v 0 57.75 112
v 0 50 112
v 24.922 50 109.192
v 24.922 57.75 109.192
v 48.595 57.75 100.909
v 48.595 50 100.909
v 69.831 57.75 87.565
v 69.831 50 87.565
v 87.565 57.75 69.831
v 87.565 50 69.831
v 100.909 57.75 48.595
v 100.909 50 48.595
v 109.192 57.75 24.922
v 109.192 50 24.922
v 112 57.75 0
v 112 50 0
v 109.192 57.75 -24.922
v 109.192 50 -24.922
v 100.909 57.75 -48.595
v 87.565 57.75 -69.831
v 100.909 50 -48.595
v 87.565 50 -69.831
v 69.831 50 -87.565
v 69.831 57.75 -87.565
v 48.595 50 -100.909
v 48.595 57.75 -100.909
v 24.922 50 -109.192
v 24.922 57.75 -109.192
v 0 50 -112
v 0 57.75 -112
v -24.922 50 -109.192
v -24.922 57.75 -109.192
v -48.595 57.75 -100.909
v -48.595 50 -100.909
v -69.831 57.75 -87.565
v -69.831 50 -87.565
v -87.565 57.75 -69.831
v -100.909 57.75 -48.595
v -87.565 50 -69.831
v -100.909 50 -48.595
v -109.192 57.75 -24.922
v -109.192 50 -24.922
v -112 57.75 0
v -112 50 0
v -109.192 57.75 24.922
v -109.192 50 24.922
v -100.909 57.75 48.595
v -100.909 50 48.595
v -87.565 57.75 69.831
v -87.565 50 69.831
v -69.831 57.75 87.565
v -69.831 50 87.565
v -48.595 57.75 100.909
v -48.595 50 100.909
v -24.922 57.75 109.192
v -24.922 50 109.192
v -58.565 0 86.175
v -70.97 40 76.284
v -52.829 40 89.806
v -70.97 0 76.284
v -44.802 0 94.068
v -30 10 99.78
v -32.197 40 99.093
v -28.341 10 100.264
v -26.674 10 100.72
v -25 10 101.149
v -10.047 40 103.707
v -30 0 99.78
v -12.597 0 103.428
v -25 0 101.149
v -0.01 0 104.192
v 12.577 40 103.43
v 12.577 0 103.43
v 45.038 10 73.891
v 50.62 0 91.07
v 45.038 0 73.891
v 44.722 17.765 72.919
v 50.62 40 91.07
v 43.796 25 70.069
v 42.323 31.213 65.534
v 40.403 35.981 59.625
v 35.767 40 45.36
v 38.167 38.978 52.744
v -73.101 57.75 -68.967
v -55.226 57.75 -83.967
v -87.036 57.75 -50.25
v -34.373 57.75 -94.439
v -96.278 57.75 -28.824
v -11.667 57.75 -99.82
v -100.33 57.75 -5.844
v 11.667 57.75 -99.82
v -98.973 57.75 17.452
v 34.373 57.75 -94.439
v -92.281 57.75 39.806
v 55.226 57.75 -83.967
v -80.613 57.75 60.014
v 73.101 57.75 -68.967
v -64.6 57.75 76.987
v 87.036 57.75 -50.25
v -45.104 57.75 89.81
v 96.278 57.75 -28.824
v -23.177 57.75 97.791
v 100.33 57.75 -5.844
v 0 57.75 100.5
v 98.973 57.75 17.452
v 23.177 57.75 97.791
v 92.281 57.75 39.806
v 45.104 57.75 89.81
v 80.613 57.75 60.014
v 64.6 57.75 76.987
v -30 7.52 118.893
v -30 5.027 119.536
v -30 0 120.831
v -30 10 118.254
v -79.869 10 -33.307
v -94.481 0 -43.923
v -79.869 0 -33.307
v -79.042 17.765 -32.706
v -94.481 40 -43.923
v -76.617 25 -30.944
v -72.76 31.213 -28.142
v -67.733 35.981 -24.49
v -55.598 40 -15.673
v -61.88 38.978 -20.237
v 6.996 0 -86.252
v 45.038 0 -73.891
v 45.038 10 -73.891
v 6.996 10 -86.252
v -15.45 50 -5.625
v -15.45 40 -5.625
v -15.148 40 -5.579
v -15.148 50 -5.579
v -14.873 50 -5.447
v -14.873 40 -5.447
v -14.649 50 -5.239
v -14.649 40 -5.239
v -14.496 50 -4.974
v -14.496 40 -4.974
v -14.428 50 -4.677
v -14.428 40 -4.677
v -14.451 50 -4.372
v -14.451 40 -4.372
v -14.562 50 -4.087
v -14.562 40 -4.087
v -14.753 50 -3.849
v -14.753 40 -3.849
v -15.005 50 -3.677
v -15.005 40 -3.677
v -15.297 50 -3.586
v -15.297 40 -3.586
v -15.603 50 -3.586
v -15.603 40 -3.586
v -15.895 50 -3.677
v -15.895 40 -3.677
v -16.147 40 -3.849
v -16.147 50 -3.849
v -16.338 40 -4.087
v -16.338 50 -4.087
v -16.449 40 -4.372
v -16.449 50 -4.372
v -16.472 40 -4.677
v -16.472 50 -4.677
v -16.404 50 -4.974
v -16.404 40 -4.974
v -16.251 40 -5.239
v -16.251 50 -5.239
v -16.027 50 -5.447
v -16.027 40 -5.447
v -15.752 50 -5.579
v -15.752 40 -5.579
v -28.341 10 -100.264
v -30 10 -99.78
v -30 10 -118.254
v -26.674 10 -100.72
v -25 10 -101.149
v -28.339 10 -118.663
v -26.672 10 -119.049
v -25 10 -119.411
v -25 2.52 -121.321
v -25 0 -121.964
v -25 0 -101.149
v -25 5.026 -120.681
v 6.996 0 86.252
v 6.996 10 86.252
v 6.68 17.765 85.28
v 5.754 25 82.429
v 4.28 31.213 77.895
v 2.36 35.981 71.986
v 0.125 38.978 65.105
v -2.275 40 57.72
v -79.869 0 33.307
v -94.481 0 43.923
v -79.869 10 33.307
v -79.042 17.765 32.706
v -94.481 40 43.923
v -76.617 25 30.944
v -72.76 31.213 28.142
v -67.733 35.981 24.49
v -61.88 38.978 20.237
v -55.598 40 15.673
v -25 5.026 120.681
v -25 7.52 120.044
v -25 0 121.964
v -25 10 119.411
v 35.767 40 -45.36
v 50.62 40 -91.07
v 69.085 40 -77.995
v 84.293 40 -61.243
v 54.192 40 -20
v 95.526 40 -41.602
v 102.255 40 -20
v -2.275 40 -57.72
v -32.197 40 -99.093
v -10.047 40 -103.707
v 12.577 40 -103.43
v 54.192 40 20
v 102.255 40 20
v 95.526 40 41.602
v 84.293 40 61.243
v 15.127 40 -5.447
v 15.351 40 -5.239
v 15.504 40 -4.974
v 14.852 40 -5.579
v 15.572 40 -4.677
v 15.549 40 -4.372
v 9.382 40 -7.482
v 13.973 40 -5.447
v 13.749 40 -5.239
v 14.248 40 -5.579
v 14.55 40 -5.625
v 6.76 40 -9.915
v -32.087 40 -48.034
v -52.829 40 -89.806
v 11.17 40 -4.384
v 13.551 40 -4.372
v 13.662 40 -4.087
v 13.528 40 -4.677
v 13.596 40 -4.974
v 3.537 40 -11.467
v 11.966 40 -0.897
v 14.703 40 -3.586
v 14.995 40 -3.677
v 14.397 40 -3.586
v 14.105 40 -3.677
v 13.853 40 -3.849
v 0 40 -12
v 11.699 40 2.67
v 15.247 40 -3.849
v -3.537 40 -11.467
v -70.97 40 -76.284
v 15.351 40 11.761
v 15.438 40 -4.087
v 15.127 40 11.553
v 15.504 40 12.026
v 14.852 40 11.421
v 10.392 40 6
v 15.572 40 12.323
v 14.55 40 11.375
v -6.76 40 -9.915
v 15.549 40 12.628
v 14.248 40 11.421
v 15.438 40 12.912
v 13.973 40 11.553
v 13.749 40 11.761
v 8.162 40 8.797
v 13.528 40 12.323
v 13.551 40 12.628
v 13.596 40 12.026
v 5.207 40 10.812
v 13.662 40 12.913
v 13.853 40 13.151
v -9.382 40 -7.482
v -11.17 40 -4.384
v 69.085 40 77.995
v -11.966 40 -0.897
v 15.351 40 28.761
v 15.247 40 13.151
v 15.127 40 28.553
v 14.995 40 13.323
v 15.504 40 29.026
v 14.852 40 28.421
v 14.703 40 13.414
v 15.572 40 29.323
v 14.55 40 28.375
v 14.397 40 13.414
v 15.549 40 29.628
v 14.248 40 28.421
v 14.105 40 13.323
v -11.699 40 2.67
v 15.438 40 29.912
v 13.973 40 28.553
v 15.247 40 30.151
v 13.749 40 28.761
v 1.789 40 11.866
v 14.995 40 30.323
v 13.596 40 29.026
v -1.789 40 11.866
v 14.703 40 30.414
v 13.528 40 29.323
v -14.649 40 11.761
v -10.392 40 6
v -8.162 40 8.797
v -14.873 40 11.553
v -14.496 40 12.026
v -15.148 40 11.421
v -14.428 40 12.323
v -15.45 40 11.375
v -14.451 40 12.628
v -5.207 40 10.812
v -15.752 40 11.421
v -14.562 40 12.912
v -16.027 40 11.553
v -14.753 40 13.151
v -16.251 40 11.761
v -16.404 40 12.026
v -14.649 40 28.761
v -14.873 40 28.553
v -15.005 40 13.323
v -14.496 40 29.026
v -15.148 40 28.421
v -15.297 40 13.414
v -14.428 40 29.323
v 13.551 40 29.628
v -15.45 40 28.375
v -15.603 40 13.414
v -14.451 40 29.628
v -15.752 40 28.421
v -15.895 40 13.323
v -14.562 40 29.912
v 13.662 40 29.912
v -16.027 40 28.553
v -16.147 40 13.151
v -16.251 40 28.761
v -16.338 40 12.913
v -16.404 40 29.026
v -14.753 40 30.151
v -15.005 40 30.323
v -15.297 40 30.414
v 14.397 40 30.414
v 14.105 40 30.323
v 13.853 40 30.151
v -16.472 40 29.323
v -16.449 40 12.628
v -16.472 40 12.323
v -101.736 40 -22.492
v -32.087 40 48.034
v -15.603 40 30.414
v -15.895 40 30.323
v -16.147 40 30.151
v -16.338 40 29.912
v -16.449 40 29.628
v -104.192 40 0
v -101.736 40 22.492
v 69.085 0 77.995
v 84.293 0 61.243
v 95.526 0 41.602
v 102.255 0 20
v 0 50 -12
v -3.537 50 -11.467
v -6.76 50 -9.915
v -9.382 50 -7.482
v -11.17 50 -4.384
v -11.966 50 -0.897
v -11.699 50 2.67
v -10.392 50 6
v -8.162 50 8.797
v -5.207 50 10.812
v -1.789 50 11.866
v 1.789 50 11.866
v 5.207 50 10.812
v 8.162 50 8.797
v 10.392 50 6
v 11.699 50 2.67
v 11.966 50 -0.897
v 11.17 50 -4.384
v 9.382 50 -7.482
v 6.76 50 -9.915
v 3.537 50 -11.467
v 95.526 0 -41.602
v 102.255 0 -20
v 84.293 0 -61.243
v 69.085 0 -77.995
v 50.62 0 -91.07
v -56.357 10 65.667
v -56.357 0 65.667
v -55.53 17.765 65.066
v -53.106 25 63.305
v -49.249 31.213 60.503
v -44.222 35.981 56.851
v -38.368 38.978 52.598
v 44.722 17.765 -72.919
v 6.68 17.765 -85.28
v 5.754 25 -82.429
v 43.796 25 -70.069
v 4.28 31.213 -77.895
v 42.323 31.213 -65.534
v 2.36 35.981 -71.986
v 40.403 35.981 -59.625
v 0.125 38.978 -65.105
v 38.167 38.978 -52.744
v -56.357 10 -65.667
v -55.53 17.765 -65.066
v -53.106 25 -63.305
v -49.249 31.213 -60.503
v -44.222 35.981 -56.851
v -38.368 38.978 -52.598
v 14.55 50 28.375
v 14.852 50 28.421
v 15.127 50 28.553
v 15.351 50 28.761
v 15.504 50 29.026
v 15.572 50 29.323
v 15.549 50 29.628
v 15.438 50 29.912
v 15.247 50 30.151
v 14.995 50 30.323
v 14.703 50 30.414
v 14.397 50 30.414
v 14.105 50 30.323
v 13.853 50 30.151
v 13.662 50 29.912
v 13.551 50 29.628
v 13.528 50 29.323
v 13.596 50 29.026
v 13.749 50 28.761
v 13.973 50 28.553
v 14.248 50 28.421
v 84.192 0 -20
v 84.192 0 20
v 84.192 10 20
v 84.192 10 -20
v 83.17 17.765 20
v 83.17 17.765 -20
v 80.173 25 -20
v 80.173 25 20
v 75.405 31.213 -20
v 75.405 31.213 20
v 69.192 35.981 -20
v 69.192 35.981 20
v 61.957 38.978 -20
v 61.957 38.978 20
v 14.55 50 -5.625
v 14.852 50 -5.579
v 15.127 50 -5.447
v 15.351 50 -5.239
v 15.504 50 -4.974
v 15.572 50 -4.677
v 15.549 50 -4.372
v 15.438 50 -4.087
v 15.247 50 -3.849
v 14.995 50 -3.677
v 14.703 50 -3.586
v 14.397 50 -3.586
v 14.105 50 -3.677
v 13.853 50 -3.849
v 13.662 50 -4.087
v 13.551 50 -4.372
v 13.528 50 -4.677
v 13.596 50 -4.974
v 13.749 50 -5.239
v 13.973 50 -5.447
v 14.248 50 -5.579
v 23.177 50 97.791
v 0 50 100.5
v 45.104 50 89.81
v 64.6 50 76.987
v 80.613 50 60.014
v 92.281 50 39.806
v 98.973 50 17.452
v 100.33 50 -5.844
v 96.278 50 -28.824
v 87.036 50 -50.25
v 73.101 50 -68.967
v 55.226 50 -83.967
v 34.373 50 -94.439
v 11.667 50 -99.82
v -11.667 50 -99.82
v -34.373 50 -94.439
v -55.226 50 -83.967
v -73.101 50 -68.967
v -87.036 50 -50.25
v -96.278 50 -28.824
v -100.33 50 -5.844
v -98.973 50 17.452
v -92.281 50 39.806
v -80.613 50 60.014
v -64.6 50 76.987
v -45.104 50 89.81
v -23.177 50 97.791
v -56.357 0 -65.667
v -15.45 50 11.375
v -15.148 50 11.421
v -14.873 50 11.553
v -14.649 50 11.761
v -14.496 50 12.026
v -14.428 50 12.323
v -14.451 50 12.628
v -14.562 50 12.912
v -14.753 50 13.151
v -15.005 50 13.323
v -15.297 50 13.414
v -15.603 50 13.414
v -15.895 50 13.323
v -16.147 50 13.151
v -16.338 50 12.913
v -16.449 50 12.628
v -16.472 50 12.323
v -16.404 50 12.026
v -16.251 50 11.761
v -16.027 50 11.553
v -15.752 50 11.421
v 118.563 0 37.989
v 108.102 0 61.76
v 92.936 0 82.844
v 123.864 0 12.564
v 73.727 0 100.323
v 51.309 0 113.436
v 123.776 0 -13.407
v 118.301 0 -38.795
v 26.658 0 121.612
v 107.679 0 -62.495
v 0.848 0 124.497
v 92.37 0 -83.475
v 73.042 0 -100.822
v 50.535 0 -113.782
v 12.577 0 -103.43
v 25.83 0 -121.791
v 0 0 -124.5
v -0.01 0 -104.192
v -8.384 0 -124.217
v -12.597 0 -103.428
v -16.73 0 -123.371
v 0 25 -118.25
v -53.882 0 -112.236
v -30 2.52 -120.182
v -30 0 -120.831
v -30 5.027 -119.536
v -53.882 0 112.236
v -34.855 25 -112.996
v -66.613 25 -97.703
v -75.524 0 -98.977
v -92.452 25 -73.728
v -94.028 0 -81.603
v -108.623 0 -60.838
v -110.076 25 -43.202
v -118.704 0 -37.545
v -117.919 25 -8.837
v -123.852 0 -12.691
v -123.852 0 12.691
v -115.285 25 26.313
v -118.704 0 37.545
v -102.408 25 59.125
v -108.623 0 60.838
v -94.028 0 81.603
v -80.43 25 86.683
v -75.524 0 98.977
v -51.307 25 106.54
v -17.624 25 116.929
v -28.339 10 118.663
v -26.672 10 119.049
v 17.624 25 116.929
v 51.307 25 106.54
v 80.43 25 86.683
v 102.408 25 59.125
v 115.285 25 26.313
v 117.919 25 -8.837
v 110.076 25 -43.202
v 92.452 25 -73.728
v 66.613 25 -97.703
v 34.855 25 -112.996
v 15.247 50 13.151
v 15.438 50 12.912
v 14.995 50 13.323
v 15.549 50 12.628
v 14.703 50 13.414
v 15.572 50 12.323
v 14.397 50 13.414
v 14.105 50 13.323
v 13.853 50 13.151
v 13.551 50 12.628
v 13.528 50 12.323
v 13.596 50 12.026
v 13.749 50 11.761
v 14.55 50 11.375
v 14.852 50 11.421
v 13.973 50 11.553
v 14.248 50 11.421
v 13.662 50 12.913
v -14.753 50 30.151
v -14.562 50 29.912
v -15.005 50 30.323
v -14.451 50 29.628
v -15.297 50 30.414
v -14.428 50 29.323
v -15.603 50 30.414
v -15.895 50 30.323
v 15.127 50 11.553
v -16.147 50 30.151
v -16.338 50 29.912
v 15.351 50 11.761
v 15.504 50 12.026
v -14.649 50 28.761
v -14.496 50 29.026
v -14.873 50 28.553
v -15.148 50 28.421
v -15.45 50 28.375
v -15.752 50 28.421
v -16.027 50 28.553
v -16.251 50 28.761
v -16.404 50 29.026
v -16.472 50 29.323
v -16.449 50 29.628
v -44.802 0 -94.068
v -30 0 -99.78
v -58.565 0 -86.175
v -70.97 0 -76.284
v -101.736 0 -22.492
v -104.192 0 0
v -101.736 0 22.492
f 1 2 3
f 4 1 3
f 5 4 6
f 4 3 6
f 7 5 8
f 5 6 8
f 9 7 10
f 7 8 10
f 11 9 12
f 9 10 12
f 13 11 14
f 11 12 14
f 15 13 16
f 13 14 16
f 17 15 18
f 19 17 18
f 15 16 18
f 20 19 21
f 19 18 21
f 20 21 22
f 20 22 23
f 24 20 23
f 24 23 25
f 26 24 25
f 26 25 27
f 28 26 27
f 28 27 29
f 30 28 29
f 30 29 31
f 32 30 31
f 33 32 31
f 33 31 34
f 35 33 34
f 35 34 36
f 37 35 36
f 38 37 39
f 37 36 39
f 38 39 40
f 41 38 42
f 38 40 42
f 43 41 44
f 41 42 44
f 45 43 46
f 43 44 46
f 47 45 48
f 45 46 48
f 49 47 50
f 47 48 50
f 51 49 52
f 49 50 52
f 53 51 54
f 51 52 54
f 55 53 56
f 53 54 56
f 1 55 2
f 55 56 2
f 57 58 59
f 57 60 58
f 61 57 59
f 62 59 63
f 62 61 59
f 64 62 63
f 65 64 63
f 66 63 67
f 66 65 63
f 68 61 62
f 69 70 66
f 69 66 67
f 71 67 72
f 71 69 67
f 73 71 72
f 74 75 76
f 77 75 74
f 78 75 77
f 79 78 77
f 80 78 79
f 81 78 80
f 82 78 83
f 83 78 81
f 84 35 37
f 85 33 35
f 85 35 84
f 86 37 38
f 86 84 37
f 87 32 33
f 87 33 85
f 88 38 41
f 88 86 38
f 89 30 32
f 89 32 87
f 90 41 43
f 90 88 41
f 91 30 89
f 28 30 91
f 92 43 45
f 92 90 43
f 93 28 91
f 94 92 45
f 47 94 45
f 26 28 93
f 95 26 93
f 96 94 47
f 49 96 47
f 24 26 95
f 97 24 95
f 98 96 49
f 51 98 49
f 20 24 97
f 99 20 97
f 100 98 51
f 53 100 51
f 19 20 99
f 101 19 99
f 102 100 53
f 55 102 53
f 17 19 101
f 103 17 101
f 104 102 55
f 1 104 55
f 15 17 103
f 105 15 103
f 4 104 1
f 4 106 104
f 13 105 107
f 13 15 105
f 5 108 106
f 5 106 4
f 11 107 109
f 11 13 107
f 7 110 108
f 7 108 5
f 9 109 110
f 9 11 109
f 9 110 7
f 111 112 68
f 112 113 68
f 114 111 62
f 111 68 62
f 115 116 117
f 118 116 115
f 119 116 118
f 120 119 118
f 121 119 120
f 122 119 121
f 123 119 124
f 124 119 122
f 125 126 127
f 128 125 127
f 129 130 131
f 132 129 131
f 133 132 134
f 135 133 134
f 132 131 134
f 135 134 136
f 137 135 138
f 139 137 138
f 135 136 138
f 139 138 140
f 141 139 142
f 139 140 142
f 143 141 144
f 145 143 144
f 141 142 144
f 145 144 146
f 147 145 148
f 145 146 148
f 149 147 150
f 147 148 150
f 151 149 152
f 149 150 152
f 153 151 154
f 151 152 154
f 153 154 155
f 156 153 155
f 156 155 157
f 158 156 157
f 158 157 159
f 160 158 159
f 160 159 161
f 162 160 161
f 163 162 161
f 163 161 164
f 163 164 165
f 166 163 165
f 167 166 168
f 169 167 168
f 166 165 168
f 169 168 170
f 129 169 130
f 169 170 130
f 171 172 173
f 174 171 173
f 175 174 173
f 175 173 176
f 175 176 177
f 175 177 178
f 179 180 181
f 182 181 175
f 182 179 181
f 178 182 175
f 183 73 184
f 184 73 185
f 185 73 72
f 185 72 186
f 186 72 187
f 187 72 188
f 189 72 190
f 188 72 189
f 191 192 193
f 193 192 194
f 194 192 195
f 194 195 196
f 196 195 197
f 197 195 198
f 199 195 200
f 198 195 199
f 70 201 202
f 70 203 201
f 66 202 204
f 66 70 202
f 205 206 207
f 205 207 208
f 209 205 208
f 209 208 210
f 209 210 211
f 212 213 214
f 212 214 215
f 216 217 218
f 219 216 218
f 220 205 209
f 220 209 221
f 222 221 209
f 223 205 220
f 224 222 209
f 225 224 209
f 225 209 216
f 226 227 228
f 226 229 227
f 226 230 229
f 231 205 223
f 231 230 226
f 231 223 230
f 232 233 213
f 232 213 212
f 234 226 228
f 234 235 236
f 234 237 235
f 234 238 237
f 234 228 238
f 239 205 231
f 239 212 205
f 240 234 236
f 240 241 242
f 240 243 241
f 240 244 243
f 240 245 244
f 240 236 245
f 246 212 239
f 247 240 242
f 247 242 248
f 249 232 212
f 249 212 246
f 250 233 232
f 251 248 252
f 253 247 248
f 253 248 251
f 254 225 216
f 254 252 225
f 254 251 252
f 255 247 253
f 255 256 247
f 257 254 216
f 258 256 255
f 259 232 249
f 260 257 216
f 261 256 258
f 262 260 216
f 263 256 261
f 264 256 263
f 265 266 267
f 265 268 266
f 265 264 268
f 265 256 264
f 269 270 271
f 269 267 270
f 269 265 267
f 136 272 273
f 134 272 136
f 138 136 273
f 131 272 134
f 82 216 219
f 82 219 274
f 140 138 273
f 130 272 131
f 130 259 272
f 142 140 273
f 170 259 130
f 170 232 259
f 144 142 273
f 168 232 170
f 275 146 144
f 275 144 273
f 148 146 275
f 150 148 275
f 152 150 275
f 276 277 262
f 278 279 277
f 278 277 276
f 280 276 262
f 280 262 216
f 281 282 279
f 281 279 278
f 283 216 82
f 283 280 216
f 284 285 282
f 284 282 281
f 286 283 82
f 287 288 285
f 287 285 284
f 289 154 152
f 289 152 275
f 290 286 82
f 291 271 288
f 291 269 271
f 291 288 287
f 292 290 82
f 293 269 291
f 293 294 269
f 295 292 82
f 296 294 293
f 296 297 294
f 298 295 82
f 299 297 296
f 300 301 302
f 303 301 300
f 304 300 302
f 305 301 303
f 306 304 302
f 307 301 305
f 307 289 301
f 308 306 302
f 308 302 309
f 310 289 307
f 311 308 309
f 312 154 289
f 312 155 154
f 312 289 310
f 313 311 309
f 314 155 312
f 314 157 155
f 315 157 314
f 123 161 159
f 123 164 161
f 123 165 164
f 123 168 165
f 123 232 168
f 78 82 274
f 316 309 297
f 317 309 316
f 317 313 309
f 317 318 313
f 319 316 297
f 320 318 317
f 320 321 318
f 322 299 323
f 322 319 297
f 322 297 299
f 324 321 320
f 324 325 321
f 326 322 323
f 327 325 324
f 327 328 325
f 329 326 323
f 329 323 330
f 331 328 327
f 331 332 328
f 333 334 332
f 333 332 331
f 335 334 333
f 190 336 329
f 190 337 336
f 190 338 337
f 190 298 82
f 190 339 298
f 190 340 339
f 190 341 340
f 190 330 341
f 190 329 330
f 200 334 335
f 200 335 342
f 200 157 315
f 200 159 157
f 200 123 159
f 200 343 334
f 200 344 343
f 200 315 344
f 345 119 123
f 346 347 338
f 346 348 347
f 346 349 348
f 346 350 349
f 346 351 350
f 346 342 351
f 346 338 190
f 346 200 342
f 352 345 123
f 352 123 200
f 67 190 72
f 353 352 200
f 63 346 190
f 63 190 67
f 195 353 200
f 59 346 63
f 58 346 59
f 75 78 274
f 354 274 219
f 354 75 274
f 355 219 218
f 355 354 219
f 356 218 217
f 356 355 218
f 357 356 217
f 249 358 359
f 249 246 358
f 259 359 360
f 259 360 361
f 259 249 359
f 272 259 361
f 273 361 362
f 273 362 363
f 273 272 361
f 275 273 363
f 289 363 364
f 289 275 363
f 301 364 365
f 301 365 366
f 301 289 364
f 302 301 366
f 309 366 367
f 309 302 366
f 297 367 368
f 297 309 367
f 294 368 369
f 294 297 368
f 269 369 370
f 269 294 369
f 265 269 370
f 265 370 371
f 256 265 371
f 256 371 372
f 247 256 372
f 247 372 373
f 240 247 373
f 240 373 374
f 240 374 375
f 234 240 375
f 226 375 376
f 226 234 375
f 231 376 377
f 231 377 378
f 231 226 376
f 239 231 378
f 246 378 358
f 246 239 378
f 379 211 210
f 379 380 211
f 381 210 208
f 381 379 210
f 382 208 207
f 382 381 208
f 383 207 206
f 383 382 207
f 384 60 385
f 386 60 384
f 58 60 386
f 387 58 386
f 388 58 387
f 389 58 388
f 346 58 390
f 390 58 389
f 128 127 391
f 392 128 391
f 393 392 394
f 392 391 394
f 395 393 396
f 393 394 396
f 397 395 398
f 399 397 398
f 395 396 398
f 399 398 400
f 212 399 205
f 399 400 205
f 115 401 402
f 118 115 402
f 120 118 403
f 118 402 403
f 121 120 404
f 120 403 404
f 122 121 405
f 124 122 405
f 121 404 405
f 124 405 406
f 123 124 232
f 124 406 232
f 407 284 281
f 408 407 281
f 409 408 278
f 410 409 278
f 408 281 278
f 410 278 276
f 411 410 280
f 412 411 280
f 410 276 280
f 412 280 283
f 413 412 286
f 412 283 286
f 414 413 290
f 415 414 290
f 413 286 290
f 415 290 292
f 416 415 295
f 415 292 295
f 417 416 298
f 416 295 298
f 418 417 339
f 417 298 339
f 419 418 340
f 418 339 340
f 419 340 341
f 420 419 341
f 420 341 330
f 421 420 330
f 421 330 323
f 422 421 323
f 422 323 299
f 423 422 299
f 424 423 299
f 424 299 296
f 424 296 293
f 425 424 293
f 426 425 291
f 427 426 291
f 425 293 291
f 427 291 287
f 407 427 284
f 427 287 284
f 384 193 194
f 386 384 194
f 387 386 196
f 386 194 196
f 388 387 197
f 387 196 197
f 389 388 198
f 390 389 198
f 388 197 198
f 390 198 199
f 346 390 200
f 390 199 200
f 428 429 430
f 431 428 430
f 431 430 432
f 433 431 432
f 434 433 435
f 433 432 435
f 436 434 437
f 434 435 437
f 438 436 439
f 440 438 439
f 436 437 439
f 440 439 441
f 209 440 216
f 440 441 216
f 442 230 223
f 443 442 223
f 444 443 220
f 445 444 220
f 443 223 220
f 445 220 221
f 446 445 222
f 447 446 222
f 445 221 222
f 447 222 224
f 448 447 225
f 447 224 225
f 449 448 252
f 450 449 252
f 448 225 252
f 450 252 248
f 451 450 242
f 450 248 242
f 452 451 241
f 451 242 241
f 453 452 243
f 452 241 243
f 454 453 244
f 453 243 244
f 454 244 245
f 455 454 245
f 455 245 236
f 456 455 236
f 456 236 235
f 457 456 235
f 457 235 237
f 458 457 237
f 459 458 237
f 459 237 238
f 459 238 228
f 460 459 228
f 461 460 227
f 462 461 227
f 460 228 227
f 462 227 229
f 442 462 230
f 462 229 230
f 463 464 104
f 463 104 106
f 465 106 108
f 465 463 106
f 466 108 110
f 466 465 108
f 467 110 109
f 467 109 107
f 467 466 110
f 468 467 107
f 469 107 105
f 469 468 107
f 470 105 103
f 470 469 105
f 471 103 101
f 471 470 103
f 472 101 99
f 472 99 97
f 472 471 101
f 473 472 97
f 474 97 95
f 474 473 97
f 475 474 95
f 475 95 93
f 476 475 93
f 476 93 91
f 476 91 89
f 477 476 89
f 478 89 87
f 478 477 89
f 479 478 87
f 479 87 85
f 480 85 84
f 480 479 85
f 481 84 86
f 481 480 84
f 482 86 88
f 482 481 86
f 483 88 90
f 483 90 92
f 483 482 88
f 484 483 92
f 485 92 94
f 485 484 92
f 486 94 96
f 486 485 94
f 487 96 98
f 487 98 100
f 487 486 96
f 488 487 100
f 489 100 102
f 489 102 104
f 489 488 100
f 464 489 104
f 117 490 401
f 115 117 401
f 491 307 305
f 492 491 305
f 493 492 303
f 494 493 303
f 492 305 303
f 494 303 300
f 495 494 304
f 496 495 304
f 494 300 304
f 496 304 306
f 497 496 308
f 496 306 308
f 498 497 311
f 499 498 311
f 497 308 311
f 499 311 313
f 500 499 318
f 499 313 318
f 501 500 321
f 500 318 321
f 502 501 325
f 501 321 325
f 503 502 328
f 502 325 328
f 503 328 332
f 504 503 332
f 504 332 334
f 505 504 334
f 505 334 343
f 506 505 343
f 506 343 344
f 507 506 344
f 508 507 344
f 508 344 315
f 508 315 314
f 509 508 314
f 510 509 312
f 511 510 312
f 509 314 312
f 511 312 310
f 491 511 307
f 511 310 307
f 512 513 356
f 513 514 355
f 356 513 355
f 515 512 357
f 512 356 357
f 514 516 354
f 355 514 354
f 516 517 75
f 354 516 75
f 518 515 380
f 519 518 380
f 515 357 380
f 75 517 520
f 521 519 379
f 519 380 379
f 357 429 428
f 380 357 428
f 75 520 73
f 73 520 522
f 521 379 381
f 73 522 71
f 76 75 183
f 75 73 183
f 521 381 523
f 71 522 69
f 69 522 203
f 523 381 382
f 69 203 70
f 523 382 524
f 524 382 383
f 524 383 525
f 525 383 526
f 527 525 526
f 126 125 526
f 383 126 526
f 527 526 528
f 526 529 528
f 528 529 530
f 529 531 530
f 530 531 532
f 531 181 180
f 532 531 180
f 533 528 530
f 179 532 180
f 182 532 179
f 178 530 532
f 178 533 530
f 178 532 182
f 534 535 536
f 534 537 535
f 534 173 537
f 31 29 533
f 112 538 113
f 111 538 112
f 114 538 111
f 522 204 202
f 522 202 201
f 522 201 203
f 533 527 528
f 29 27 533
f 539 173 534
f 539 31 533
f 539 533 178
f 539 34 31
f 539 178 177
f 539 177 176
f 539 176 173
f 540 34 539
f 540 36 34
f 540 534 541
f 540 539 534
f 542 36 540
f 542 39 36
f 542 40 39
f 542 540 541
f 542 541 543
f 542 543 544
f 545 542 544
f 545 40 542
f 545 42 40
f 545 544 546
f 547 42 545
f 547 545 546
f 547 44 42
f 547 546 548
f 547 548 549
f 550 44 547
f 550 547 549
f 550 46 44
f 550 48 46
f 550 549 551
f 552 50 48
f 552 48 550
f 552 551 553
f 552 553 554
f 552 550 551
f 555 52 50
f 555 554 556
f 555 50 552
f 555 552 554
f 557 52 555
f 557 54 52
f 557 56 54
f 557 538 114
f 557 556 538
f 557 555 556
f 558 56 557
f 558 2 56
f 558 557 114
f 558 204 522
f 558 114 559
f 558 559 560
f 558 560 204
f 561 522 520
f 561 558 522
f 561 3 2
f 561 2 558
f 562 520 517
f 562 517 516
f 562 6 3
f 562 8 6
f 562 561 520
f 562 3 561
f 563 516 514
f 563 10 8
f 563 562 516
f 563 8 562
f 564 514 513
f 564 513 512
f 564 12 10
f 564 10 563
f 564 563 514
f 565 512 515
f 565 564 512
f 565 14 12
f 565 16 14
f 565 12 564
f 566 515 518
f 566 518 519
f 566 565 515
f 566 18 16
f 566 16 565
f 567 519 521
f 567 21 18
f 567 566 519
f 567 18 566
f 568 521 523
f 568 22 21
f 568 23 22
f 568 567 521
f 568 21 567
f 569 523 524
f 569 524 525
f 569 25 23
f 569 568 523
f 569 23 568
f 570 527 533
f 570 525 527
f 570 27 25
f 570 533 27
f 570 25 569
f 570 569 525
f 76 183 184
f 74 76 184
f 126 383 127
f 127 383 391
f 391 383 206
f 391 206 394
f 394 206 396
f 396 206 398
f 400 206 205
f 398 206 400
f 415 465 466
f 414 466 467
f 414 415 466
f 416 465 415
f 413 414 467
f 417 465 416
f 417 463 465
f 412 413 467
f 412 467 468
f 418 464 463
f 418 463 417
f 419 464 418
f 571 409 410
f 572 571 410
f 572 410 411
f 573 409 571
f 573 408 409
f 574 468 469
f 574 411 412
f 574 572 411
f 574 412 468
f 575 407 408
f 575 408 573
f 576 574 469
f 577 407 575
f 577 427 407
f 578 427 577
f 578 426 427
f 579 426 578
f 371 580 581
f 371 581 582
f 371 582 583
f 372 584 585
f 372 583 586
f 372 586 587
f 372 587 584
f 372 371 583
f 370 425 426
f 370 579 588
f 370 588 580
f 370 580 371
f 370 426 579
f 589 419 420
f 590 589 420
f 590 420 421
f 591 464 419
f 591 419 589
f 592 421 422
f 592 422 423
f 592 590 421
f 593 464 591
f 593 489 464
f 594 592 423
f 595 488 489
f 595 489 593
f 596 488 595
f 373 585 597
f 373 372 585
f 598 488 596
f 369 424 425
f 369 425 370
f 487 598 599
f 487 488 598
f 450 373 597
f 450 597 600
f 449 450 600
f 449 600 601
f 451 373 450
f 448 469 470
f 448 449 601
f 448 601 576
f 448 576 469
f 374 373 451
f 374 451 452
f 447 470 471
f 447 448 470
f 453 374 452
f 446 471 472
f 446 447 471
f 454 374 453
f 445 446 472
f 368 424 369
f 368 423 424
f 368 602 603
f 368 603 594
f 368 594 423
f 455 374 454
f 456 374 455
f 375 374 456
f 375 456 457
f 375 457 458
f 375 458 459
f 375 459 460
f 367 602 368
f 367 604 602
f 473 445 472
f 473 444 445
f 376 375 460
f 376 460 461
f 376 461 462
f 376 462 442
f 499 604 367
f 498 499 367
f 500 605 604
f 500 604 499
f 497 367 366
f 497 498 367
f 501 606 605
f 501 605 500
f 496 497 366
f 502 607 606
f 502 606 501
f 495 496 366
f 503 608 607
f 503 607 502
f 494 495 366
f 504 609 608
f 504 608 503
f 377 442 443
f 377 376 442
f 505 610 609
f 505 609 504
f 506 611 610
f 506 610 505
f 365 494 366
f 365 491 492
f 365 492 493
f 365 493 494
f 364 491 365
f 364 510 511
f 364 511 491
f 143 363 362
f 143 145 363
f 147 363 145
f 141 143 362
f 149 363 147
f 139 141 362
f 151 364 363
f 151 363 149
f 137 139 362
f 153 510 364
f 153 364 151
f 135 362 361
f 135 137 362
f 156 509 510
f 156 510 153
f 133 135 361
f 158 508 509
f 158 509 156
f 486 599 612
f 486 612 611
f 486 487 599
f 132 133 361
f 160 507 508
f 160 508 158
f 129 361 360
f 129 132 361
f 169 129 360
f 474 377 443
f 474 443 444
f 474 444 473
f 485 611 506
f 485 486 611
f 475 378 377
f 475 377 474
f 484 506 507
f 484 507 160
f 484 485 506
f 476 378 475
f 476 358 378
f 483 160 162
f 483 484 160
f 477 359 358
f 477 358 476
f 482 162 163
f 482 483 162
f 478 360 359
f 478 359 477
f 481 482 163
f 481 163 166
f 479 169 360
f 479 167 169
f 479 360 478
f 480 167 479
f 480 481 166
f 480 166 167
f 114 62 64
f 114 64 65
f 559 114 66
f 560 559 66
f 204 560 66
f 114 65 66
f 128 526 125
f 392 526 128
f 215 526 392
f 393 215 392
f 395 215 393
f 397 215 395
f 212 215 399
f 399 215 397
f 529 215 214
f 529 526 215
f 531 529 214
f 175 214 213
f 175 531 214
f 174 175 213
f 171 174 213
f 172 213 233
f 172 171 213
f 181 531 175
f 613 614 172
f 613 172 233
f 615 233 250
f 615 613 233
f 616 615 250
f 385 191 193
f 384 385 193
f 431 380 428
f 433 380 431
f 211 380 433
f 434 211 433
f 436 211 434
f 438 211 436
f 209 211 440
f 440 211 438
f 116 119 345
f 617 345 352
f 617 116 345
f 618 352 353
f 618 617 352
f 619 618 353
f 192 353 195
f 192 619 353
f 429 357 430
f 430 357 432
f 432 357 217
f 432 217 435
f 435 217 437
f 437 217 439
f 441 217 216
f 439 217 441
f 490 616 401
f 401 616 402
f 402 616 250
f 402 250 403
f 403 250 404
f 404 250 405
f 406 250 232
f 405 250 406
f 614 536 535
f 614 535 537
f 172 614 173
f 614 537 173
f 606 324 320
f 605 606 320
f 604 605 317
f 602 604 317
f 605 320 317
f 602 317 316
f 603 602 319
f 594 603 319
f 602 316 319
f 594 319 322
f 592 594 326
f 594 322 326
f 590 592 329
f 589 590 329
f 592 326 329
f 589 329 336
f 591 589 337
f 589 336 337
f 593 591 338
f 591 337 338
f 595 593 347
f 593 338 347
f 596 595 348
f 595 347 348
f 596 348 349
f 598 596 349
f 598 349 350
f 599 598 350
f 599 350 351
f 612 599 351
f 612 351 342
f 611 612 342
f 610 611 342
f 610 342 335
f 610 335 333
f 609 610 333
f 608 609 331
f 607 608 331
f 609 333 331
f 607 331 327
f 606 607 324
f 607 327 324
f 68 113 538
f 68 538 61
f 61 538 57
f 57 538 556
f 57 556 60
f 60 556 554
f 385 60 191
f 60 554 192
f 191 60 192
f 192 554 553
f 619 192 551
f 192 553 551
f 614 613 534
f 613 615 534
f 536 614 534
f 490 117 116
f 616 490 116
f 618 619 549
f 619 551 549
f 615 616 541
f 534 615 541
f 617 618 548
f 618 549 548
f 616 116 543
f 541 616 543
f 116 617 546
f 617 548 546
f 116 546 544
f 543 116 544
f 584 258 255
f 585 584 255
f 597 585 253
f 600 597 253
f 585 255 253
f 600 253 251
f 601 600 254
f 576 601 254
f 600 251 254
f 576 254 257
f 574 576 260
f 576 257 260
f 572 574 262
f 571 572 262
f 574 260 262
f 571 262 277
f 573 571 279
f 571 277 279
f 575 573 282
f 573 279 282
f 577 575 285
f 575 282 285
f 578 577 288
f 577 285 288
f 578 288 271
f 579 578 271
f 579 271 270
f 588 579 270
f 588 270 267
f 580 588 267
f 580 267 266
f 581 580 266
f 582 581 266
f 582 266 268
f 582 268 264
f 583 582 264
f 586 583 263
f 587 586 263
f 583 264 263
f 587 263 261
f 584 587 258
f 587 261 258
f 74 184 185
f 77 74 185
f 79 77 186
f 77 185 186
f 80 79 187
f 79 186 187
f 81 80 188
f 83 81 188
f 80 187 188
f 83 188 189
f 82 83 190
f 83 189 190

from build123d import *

# Parameters (mm, degrees)
SKETCH10_R              = 1.025
CUT_EXTRUDE2_DEPTH      = 10
SKETCH11_R              = 112
SKETCH11_R_2            = 100.5
BOSS_EXTRUDE1_DEPTH     = 7.75
BOSS_EXTRUDE2_DEPTH     = 20
CIRPATTERN1_COUNT       = 5
CUT_EXTRUDE3_DEPTH      = 285.75526773
CUT_EXTRUDE3_DEPTH_BACK = 285.75526773
SKETCH14_W              = 5
SKETCH14_H              = 10


with BuildPart() as part:
    # Sketch4 → Revolve1 (revolve)
    with BuildSketch(Plane.XY, mode=Mode.PRIVATE) as revolve1_sk:
        Polygon((12, 50), (12, 40), (104.192235936, 40), (104.192235936, 0), (124.5, 0), (112, 50), align=None)
    revolve(revolve1_sk.sketch.rotate(Axis((0, 0, 0), (0, 1, 0)), 90), axis=Axis((0, 0, 0), (0, 1, 0)))

    # Sketch10 → Cut-Extrude2 (cut)
    with BuildSketch(Plane.XZ.offset(-40)):
        with Locations(Location((14.55, 12.4, 0), (0, 0, 270))):
            Circle(SKETCH10_R)
        with Locations(Location((-15.45, 12.4, 0), (0, 0, 270))):
            Circle(SKETCH10_R)
        with Locations(Location((-15.45, 29.4, 0), (0, 0, 270))):
            Circle(SKETCH10_R)
        with Locations(Location((14.55, 29.4, 0), (0, 0, 270))):
            Circle(SKETCH10_R)
        with Locations(Location((14.55, -4.6, 0), (0, 0, 270))):
            Circle(SKETCH10_R)
        with Locations(Location((-15.45, -4.6, 0), (0, 0, 270))):
            Circle(SKETCH10_R)
    extrude(amount=-CUT_EXTRUDE2_DEPTH, mode=Mode.SUBTRACT)

    # Sketch11 → Boss-Extrude1 (add)
    with BuildSketch(Plane(origin=(0, 50, 0), x_dir=(1, 0, 0), z_dir=(0, 1, 0))):
        with Locations(Location((0, 0, 0), (0, 0, 270))):
            Circle(SKETCH11_R)
        with Locations(Location((0, 0, 0), (0, 0, 270))):
            Circle(SKETCH11_R_2, mode=Mode.SUBTRACT)
    extrude(amount=BOSS_EXTRUDE1_DEPTH)

    # Sketch13 → Boss-Extrude2 (add, symmetric)
    with BuildSketch(Plane.XY):
        with BuildLine():
            ThreePointArc((84.192235936, 10), (75.405439372, 31.213203436), (54.192235936, 40))
            Line((54.192235936, 40), (104.192235936, 40))
            Line((104.192235936, 40), (104.192235936, 0))
            Line((104.192235936, 0), (84.192235936, 0))
            Line((84.192235936, 0), (84.192235936, 10))
        make_face()
    boss_extrude2 = extrude(amount=BOSS_EXTRUDE2_DEPTH, both=True)

    # CirPattern1: Boss-Extrude2 ×5 about axis
    cirpattern1_axis = Axis((0, 0, 0), (0, 1, 0))
    for i in range(1, CIRPATTERN1_COUNT):
        add(boss_extrude2.rotate(cirpattern1_axis, i * 360 / CIRPATTERN1_COUNT))

    # Sketch14 → Cut-Extrude3 (cut, two sides: drawn at the far end of the back side and taken through both)
    with BuildSketch(Plane.XY.offset(125).offset(-CUT_EXTRUDE3_DEPTH_BACK)):
        with Locations((-27.5, 5)):
            Rectangle(SKETCH14_W, SKETCH14_H)
    extrude(amount=CUT_EXTRUDE3_DEPTH + CUT_EXTRUDE3_DEPTH_BACK, mode=Mode.SUBTRACT)


solid = part.part
